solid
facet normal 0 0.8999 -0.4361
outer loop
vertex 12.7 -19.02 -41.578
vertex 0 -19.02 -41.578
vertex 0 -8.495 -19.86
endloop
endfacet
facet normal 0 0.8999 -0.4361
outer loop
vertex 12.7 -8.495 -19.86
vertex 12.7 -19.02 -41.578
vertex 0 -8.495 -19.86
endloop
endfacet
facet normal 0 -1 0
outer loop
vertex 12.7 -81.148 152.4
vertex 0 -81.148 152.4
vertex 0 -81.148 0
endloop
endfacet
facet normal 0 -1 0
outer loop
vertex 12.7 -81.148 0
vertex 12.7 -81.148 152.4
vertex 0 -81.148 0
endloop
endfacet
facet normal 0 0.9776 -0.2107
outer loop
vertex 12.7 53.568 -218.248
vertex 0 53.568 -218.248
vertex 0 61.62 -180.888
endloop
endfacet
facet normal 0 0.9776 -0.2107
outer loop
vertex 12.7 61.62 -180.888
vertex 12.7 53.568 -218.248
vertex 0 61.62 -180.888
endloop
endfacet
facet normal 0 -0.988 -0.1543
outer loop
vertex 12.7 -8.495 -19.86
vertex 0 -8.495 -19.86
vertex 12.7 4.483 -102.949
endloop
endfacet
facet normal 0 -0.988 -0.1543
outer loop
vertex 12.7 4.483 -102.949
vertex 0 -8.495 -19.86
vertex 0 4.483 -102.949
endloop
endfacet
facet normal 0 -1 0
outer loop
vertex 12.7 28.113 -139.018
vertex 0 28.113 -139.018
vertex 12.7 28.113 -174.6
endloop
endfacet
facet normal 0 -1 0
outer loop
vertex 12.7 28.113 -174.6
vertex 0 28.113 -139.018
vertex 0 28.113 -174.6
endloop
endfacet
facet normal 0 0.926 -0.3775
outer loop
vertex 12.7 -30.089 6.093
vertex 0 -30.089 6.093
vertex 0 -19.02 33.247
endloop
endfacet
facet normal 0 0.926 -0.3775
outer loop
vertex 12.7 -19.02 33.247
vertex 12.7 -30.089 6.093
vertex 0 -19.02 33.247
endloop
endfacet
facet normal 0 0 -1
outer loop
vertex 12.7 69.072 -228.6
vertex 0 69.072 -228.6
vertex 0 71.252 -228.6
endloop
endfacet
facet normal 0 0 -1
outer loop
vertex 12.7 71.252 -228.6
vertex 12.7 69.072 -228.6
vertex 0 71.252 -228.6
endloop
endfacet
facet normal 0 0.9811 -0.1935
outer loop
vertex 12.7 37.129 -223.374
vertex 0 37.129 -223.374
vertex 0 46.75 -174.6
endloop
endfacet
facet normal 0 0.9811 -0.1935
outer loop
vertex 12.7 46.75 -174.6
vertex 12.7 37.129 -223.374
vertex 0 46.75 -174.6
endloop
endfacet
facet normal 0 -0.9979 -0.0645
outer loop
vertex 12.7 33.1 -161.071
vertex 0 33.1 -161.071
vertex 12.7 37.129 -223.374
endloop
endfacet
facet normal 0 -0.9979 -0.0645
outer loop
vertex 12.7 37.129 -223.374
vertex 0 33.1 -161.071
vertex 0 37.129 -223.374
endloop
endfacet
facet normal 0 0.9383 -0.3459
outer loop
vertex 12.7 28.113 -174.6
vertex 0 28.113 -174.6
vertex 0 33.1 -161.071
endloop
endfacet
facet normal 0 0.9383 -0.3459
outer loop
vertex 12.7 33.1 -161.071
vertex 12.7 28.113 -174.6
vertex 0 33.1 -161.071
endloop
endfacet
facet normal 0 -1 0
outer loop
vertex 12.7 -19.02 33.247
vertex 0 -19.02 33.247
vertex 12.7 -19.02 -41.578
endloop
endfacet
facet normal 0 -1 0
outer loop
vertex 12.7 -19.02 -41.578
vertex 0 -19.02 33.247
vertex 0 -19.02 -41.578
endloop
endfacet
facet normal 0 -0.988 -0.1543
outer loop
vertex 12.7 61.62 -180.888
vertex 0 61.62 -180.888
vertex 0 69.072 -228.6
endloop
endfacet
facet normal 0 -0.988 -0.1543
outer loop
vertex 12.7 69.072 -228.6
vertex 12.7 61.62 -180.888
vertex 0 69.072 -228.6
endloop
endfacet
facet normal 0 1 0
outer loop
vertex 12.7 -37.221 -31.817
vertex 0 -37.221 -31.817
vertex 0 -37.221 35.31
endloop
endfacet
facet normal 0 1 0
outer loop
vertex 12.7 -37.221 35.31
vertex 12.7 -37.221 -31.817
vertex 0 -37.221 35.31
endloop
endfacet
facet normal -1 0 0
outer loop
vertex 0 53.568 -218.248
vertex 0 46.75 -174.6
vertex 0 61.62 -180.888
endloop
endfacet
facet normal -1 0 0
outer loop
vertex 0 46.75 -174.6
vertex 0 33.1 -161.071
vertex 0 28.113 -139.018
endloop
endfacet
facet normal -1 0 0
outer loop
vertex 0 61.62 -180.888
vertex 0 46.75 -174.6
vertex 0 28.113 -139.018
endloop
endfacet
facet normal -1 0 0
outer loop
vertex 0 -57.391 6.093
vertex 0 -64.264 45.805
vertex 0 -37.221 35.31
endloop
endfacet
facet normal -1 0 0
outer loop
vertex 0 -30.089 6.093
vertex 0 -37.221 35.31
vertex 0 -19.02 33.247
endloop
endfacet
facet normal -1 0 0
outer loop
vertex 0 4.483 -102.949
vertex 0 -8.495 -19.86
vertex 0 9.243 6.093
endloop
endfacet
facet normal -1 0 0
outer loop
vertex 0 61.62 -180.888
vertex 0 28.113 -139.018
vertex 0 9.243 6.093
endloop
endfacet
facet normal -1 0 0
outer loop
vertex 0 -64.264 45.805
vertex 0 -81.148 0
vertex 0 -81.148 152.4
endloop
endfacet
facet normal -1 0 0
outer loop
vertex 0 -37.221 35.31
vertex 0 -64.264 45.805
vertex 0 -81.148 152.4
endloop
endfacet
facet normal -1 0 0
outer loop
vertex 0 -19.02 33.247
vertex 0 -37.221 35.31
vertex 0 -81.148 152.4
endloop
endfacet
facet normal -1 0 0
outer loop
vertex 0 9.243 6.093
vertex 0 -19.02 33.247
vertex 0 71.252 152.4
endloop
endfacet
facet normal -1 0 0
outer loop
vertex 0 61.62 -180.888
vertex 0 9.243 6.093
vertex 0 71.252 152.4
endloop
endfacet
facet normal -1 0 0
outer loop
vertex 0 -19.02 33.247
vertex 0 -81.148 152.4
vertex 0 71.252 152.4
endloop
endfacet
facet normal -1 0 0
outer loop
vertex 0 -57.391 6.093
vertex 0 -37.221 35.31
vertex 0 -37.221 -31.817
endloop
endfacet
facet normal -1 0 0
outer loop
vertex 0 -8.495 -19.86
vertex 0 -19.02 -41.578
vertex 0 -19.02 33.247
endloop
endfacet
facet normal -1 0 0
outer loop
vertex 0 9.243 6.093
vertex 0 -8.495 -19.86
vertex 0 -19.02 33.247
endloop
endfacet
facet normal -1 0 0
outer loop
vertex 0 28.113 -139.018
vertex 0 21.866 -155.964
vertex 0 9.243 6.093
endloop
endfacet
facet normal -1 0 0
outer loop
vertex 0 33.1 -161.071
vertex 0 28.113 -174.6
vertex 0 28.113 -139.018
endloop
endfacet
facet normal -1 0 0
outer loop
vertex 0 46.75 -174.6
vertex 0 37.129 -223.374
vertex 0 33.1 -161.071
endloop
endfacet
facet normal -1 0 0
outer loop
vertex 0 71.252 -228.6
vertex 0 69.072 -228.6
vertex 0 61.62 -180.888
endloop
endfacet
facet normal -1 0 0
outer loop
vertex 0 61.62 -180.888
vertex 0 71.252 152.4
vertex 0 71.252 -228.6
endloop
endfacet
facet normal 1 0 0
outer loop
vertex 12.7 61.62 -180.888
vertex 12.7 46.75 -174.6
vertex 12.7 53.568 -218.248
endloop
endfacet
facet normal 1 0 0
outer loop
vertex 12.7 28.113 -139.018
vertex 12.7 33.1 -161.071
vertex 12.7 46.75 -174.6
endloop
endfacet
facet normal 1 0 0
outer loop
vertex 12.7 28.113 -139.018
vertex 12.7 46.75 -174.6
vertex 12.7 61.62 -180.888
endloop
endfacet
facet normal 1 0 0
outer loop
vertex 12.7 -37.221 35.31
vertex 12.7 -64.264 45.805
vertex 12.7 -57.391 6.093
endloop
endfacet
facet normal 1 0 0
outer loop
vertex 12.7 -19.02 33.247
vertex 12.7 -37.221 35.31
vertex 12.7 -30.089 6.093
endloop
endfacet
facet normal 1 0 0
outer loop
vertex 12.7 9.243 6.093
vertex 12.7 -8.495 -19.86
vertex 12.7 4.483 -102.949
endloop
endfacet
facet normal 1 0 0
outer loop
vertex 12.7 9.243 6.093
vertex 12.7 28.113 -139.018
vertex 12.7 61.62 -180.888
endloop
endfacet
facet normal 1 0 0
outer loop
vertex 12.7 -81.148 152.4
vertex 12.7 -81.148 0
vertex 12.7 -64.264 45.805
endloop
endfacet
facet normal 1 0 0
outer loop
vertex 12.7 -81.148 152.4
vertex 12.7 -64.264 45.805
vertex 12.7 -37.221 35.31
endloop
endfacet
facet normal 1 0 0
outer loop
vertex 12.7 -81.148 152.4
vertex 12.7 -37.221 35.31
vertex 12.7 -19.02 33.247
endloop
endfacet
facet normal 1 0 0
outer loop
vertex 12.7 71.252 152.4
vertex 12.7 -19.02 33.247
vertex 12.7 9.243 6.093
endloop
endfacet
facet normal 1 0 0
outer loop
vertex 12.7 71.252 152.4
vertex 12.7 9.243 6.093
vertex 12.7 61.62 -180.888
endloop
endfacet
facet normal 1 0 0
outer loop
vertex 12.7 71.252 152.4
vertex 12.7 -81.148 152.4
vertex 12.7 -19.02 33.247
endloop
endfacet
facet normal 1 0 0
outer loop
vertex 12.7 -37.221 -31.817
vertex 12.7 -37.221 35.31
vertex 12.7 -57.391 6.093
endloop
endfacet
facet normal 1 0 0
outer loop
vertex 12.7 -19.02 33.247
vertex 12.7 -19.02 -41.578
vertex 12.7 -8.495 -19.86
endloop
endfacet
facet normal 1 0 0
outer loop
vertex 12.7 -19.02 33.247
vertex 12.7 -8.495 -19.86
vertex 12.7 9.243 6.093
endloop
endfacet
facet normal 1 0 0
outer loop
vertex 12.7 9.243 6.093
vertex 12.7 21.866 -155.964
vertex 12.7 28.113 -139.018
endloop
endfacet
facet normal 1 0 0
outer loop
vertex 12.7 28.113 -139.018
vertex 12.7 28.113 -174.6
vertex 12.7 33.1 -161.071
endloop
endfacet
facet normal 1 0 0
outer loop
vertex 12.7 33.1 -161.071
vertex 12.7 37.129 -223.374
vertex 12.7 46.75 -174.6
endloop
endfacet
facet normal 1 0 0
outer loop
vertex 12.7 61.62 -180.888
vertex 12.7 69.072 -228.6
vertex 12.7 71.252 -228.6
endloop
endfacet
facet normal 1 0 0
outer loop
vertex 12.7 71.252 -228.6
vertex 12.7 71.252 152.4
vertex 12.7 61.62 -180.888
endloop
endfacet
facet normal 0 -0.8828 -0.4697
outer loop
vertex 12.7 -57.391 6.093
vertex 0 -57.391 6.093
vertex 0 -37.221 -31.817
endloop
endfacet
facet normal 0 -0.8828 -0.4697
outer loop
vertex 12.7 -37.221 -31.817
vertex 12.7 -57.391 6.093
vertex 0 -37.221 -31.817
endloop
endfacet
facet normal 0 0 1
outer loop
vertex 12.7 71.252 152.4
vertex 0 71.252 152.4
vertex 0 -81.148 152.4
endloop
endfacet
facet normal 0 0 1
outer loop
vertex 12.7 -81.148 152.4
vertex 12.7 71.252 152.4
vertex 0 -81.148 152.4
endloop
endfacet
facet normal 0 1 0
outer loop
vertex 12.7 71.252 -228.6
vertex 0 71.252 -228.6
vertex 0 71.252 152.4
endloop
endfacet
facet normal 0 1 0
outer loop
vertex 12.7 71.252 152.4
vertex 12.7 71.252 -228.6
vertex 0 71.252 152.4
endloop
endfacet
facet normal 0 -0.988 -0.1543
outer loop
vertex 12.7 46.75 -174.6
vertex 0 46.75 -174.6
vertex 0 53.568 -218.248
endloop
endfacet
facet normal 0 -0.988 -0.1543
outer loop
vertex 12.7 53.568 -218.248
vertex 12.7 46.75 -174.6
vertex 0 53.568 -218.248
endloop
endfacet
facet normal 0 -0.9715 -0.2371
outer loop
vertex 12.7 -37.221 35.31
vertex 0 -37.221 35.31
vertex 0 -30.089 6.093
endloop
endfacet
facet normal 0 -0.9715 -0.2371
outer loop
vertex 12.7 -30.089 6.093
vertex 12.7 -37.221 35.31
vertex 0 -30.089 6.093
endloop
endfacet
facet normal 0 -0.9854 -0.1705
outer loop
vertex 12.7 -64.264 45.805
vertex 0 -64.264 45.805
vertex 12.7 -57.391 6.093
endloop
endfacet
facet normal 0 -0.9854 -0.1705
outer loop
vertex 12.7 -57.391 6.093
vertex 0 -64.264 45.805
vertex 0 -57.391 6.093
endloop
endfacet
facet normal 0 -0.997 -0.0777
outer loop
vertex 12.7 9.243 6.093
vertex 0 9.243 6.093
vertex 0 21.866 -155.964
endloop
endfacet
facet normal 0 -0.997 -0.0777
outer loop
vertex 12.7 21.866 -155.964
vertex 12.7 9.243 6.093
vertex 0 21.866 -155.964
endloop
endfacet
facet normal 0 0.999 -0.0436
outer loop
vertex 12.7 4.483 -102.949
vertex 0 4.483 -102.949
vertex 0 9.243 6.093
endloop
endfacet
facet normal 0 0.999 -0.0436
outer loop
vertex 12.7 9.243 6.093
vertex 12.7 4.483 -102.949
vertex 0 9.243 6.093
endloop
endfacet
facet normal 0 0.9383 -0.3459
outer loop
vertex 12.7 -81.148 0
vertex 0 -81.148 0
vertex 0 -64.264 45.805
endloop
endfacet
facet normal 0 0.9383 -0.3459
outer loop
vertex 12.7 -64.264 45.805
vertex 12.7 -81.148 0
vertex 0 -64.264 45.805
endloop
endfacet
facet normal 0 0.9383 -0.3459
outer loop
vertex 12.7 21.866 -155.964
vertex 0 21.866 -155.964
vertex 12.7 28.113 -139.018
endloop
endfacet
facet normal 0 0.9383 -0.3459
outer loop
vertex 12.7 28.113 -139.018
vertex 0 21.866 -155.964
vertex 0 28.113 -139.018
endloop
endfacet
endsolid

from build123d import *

# Parameters (mm, degrees)
F1_DEPTH = 12.7


with BuildPart() as f1:
    # F0 (on Right) → F1 (new body)
    with BuildSketch(Plane.YZ):
        Polygon((-81.148056, 152.4), (-81.148056, 0), (-64.264163, 45.804784), (-57.39085, 6.09312), (-37.22056, -31.817149), (-37.22056, 35.310104), (-30.08927, 6.09312), (-19.019617, 33.24692), (-19.019617, -41.578095), (-8.49505, -19.859882), (4.483057, -102.9488), (9.243387, 6.09312), (21.866368, -155.964419), (28.112774, -139.018371), (28.112774, -174.600467), (33.099876, -161.07082), (37.128638, -223.373905), (46.750363, -174.600467), (53.567908, -218.248002), (61.619878, -180.88825), (69.072234, -228.6), (71.251944, -228.6), (71.251944, 152.4), align=None)
    extrude(amount=F1_DEPTH)


solid = f1.part
